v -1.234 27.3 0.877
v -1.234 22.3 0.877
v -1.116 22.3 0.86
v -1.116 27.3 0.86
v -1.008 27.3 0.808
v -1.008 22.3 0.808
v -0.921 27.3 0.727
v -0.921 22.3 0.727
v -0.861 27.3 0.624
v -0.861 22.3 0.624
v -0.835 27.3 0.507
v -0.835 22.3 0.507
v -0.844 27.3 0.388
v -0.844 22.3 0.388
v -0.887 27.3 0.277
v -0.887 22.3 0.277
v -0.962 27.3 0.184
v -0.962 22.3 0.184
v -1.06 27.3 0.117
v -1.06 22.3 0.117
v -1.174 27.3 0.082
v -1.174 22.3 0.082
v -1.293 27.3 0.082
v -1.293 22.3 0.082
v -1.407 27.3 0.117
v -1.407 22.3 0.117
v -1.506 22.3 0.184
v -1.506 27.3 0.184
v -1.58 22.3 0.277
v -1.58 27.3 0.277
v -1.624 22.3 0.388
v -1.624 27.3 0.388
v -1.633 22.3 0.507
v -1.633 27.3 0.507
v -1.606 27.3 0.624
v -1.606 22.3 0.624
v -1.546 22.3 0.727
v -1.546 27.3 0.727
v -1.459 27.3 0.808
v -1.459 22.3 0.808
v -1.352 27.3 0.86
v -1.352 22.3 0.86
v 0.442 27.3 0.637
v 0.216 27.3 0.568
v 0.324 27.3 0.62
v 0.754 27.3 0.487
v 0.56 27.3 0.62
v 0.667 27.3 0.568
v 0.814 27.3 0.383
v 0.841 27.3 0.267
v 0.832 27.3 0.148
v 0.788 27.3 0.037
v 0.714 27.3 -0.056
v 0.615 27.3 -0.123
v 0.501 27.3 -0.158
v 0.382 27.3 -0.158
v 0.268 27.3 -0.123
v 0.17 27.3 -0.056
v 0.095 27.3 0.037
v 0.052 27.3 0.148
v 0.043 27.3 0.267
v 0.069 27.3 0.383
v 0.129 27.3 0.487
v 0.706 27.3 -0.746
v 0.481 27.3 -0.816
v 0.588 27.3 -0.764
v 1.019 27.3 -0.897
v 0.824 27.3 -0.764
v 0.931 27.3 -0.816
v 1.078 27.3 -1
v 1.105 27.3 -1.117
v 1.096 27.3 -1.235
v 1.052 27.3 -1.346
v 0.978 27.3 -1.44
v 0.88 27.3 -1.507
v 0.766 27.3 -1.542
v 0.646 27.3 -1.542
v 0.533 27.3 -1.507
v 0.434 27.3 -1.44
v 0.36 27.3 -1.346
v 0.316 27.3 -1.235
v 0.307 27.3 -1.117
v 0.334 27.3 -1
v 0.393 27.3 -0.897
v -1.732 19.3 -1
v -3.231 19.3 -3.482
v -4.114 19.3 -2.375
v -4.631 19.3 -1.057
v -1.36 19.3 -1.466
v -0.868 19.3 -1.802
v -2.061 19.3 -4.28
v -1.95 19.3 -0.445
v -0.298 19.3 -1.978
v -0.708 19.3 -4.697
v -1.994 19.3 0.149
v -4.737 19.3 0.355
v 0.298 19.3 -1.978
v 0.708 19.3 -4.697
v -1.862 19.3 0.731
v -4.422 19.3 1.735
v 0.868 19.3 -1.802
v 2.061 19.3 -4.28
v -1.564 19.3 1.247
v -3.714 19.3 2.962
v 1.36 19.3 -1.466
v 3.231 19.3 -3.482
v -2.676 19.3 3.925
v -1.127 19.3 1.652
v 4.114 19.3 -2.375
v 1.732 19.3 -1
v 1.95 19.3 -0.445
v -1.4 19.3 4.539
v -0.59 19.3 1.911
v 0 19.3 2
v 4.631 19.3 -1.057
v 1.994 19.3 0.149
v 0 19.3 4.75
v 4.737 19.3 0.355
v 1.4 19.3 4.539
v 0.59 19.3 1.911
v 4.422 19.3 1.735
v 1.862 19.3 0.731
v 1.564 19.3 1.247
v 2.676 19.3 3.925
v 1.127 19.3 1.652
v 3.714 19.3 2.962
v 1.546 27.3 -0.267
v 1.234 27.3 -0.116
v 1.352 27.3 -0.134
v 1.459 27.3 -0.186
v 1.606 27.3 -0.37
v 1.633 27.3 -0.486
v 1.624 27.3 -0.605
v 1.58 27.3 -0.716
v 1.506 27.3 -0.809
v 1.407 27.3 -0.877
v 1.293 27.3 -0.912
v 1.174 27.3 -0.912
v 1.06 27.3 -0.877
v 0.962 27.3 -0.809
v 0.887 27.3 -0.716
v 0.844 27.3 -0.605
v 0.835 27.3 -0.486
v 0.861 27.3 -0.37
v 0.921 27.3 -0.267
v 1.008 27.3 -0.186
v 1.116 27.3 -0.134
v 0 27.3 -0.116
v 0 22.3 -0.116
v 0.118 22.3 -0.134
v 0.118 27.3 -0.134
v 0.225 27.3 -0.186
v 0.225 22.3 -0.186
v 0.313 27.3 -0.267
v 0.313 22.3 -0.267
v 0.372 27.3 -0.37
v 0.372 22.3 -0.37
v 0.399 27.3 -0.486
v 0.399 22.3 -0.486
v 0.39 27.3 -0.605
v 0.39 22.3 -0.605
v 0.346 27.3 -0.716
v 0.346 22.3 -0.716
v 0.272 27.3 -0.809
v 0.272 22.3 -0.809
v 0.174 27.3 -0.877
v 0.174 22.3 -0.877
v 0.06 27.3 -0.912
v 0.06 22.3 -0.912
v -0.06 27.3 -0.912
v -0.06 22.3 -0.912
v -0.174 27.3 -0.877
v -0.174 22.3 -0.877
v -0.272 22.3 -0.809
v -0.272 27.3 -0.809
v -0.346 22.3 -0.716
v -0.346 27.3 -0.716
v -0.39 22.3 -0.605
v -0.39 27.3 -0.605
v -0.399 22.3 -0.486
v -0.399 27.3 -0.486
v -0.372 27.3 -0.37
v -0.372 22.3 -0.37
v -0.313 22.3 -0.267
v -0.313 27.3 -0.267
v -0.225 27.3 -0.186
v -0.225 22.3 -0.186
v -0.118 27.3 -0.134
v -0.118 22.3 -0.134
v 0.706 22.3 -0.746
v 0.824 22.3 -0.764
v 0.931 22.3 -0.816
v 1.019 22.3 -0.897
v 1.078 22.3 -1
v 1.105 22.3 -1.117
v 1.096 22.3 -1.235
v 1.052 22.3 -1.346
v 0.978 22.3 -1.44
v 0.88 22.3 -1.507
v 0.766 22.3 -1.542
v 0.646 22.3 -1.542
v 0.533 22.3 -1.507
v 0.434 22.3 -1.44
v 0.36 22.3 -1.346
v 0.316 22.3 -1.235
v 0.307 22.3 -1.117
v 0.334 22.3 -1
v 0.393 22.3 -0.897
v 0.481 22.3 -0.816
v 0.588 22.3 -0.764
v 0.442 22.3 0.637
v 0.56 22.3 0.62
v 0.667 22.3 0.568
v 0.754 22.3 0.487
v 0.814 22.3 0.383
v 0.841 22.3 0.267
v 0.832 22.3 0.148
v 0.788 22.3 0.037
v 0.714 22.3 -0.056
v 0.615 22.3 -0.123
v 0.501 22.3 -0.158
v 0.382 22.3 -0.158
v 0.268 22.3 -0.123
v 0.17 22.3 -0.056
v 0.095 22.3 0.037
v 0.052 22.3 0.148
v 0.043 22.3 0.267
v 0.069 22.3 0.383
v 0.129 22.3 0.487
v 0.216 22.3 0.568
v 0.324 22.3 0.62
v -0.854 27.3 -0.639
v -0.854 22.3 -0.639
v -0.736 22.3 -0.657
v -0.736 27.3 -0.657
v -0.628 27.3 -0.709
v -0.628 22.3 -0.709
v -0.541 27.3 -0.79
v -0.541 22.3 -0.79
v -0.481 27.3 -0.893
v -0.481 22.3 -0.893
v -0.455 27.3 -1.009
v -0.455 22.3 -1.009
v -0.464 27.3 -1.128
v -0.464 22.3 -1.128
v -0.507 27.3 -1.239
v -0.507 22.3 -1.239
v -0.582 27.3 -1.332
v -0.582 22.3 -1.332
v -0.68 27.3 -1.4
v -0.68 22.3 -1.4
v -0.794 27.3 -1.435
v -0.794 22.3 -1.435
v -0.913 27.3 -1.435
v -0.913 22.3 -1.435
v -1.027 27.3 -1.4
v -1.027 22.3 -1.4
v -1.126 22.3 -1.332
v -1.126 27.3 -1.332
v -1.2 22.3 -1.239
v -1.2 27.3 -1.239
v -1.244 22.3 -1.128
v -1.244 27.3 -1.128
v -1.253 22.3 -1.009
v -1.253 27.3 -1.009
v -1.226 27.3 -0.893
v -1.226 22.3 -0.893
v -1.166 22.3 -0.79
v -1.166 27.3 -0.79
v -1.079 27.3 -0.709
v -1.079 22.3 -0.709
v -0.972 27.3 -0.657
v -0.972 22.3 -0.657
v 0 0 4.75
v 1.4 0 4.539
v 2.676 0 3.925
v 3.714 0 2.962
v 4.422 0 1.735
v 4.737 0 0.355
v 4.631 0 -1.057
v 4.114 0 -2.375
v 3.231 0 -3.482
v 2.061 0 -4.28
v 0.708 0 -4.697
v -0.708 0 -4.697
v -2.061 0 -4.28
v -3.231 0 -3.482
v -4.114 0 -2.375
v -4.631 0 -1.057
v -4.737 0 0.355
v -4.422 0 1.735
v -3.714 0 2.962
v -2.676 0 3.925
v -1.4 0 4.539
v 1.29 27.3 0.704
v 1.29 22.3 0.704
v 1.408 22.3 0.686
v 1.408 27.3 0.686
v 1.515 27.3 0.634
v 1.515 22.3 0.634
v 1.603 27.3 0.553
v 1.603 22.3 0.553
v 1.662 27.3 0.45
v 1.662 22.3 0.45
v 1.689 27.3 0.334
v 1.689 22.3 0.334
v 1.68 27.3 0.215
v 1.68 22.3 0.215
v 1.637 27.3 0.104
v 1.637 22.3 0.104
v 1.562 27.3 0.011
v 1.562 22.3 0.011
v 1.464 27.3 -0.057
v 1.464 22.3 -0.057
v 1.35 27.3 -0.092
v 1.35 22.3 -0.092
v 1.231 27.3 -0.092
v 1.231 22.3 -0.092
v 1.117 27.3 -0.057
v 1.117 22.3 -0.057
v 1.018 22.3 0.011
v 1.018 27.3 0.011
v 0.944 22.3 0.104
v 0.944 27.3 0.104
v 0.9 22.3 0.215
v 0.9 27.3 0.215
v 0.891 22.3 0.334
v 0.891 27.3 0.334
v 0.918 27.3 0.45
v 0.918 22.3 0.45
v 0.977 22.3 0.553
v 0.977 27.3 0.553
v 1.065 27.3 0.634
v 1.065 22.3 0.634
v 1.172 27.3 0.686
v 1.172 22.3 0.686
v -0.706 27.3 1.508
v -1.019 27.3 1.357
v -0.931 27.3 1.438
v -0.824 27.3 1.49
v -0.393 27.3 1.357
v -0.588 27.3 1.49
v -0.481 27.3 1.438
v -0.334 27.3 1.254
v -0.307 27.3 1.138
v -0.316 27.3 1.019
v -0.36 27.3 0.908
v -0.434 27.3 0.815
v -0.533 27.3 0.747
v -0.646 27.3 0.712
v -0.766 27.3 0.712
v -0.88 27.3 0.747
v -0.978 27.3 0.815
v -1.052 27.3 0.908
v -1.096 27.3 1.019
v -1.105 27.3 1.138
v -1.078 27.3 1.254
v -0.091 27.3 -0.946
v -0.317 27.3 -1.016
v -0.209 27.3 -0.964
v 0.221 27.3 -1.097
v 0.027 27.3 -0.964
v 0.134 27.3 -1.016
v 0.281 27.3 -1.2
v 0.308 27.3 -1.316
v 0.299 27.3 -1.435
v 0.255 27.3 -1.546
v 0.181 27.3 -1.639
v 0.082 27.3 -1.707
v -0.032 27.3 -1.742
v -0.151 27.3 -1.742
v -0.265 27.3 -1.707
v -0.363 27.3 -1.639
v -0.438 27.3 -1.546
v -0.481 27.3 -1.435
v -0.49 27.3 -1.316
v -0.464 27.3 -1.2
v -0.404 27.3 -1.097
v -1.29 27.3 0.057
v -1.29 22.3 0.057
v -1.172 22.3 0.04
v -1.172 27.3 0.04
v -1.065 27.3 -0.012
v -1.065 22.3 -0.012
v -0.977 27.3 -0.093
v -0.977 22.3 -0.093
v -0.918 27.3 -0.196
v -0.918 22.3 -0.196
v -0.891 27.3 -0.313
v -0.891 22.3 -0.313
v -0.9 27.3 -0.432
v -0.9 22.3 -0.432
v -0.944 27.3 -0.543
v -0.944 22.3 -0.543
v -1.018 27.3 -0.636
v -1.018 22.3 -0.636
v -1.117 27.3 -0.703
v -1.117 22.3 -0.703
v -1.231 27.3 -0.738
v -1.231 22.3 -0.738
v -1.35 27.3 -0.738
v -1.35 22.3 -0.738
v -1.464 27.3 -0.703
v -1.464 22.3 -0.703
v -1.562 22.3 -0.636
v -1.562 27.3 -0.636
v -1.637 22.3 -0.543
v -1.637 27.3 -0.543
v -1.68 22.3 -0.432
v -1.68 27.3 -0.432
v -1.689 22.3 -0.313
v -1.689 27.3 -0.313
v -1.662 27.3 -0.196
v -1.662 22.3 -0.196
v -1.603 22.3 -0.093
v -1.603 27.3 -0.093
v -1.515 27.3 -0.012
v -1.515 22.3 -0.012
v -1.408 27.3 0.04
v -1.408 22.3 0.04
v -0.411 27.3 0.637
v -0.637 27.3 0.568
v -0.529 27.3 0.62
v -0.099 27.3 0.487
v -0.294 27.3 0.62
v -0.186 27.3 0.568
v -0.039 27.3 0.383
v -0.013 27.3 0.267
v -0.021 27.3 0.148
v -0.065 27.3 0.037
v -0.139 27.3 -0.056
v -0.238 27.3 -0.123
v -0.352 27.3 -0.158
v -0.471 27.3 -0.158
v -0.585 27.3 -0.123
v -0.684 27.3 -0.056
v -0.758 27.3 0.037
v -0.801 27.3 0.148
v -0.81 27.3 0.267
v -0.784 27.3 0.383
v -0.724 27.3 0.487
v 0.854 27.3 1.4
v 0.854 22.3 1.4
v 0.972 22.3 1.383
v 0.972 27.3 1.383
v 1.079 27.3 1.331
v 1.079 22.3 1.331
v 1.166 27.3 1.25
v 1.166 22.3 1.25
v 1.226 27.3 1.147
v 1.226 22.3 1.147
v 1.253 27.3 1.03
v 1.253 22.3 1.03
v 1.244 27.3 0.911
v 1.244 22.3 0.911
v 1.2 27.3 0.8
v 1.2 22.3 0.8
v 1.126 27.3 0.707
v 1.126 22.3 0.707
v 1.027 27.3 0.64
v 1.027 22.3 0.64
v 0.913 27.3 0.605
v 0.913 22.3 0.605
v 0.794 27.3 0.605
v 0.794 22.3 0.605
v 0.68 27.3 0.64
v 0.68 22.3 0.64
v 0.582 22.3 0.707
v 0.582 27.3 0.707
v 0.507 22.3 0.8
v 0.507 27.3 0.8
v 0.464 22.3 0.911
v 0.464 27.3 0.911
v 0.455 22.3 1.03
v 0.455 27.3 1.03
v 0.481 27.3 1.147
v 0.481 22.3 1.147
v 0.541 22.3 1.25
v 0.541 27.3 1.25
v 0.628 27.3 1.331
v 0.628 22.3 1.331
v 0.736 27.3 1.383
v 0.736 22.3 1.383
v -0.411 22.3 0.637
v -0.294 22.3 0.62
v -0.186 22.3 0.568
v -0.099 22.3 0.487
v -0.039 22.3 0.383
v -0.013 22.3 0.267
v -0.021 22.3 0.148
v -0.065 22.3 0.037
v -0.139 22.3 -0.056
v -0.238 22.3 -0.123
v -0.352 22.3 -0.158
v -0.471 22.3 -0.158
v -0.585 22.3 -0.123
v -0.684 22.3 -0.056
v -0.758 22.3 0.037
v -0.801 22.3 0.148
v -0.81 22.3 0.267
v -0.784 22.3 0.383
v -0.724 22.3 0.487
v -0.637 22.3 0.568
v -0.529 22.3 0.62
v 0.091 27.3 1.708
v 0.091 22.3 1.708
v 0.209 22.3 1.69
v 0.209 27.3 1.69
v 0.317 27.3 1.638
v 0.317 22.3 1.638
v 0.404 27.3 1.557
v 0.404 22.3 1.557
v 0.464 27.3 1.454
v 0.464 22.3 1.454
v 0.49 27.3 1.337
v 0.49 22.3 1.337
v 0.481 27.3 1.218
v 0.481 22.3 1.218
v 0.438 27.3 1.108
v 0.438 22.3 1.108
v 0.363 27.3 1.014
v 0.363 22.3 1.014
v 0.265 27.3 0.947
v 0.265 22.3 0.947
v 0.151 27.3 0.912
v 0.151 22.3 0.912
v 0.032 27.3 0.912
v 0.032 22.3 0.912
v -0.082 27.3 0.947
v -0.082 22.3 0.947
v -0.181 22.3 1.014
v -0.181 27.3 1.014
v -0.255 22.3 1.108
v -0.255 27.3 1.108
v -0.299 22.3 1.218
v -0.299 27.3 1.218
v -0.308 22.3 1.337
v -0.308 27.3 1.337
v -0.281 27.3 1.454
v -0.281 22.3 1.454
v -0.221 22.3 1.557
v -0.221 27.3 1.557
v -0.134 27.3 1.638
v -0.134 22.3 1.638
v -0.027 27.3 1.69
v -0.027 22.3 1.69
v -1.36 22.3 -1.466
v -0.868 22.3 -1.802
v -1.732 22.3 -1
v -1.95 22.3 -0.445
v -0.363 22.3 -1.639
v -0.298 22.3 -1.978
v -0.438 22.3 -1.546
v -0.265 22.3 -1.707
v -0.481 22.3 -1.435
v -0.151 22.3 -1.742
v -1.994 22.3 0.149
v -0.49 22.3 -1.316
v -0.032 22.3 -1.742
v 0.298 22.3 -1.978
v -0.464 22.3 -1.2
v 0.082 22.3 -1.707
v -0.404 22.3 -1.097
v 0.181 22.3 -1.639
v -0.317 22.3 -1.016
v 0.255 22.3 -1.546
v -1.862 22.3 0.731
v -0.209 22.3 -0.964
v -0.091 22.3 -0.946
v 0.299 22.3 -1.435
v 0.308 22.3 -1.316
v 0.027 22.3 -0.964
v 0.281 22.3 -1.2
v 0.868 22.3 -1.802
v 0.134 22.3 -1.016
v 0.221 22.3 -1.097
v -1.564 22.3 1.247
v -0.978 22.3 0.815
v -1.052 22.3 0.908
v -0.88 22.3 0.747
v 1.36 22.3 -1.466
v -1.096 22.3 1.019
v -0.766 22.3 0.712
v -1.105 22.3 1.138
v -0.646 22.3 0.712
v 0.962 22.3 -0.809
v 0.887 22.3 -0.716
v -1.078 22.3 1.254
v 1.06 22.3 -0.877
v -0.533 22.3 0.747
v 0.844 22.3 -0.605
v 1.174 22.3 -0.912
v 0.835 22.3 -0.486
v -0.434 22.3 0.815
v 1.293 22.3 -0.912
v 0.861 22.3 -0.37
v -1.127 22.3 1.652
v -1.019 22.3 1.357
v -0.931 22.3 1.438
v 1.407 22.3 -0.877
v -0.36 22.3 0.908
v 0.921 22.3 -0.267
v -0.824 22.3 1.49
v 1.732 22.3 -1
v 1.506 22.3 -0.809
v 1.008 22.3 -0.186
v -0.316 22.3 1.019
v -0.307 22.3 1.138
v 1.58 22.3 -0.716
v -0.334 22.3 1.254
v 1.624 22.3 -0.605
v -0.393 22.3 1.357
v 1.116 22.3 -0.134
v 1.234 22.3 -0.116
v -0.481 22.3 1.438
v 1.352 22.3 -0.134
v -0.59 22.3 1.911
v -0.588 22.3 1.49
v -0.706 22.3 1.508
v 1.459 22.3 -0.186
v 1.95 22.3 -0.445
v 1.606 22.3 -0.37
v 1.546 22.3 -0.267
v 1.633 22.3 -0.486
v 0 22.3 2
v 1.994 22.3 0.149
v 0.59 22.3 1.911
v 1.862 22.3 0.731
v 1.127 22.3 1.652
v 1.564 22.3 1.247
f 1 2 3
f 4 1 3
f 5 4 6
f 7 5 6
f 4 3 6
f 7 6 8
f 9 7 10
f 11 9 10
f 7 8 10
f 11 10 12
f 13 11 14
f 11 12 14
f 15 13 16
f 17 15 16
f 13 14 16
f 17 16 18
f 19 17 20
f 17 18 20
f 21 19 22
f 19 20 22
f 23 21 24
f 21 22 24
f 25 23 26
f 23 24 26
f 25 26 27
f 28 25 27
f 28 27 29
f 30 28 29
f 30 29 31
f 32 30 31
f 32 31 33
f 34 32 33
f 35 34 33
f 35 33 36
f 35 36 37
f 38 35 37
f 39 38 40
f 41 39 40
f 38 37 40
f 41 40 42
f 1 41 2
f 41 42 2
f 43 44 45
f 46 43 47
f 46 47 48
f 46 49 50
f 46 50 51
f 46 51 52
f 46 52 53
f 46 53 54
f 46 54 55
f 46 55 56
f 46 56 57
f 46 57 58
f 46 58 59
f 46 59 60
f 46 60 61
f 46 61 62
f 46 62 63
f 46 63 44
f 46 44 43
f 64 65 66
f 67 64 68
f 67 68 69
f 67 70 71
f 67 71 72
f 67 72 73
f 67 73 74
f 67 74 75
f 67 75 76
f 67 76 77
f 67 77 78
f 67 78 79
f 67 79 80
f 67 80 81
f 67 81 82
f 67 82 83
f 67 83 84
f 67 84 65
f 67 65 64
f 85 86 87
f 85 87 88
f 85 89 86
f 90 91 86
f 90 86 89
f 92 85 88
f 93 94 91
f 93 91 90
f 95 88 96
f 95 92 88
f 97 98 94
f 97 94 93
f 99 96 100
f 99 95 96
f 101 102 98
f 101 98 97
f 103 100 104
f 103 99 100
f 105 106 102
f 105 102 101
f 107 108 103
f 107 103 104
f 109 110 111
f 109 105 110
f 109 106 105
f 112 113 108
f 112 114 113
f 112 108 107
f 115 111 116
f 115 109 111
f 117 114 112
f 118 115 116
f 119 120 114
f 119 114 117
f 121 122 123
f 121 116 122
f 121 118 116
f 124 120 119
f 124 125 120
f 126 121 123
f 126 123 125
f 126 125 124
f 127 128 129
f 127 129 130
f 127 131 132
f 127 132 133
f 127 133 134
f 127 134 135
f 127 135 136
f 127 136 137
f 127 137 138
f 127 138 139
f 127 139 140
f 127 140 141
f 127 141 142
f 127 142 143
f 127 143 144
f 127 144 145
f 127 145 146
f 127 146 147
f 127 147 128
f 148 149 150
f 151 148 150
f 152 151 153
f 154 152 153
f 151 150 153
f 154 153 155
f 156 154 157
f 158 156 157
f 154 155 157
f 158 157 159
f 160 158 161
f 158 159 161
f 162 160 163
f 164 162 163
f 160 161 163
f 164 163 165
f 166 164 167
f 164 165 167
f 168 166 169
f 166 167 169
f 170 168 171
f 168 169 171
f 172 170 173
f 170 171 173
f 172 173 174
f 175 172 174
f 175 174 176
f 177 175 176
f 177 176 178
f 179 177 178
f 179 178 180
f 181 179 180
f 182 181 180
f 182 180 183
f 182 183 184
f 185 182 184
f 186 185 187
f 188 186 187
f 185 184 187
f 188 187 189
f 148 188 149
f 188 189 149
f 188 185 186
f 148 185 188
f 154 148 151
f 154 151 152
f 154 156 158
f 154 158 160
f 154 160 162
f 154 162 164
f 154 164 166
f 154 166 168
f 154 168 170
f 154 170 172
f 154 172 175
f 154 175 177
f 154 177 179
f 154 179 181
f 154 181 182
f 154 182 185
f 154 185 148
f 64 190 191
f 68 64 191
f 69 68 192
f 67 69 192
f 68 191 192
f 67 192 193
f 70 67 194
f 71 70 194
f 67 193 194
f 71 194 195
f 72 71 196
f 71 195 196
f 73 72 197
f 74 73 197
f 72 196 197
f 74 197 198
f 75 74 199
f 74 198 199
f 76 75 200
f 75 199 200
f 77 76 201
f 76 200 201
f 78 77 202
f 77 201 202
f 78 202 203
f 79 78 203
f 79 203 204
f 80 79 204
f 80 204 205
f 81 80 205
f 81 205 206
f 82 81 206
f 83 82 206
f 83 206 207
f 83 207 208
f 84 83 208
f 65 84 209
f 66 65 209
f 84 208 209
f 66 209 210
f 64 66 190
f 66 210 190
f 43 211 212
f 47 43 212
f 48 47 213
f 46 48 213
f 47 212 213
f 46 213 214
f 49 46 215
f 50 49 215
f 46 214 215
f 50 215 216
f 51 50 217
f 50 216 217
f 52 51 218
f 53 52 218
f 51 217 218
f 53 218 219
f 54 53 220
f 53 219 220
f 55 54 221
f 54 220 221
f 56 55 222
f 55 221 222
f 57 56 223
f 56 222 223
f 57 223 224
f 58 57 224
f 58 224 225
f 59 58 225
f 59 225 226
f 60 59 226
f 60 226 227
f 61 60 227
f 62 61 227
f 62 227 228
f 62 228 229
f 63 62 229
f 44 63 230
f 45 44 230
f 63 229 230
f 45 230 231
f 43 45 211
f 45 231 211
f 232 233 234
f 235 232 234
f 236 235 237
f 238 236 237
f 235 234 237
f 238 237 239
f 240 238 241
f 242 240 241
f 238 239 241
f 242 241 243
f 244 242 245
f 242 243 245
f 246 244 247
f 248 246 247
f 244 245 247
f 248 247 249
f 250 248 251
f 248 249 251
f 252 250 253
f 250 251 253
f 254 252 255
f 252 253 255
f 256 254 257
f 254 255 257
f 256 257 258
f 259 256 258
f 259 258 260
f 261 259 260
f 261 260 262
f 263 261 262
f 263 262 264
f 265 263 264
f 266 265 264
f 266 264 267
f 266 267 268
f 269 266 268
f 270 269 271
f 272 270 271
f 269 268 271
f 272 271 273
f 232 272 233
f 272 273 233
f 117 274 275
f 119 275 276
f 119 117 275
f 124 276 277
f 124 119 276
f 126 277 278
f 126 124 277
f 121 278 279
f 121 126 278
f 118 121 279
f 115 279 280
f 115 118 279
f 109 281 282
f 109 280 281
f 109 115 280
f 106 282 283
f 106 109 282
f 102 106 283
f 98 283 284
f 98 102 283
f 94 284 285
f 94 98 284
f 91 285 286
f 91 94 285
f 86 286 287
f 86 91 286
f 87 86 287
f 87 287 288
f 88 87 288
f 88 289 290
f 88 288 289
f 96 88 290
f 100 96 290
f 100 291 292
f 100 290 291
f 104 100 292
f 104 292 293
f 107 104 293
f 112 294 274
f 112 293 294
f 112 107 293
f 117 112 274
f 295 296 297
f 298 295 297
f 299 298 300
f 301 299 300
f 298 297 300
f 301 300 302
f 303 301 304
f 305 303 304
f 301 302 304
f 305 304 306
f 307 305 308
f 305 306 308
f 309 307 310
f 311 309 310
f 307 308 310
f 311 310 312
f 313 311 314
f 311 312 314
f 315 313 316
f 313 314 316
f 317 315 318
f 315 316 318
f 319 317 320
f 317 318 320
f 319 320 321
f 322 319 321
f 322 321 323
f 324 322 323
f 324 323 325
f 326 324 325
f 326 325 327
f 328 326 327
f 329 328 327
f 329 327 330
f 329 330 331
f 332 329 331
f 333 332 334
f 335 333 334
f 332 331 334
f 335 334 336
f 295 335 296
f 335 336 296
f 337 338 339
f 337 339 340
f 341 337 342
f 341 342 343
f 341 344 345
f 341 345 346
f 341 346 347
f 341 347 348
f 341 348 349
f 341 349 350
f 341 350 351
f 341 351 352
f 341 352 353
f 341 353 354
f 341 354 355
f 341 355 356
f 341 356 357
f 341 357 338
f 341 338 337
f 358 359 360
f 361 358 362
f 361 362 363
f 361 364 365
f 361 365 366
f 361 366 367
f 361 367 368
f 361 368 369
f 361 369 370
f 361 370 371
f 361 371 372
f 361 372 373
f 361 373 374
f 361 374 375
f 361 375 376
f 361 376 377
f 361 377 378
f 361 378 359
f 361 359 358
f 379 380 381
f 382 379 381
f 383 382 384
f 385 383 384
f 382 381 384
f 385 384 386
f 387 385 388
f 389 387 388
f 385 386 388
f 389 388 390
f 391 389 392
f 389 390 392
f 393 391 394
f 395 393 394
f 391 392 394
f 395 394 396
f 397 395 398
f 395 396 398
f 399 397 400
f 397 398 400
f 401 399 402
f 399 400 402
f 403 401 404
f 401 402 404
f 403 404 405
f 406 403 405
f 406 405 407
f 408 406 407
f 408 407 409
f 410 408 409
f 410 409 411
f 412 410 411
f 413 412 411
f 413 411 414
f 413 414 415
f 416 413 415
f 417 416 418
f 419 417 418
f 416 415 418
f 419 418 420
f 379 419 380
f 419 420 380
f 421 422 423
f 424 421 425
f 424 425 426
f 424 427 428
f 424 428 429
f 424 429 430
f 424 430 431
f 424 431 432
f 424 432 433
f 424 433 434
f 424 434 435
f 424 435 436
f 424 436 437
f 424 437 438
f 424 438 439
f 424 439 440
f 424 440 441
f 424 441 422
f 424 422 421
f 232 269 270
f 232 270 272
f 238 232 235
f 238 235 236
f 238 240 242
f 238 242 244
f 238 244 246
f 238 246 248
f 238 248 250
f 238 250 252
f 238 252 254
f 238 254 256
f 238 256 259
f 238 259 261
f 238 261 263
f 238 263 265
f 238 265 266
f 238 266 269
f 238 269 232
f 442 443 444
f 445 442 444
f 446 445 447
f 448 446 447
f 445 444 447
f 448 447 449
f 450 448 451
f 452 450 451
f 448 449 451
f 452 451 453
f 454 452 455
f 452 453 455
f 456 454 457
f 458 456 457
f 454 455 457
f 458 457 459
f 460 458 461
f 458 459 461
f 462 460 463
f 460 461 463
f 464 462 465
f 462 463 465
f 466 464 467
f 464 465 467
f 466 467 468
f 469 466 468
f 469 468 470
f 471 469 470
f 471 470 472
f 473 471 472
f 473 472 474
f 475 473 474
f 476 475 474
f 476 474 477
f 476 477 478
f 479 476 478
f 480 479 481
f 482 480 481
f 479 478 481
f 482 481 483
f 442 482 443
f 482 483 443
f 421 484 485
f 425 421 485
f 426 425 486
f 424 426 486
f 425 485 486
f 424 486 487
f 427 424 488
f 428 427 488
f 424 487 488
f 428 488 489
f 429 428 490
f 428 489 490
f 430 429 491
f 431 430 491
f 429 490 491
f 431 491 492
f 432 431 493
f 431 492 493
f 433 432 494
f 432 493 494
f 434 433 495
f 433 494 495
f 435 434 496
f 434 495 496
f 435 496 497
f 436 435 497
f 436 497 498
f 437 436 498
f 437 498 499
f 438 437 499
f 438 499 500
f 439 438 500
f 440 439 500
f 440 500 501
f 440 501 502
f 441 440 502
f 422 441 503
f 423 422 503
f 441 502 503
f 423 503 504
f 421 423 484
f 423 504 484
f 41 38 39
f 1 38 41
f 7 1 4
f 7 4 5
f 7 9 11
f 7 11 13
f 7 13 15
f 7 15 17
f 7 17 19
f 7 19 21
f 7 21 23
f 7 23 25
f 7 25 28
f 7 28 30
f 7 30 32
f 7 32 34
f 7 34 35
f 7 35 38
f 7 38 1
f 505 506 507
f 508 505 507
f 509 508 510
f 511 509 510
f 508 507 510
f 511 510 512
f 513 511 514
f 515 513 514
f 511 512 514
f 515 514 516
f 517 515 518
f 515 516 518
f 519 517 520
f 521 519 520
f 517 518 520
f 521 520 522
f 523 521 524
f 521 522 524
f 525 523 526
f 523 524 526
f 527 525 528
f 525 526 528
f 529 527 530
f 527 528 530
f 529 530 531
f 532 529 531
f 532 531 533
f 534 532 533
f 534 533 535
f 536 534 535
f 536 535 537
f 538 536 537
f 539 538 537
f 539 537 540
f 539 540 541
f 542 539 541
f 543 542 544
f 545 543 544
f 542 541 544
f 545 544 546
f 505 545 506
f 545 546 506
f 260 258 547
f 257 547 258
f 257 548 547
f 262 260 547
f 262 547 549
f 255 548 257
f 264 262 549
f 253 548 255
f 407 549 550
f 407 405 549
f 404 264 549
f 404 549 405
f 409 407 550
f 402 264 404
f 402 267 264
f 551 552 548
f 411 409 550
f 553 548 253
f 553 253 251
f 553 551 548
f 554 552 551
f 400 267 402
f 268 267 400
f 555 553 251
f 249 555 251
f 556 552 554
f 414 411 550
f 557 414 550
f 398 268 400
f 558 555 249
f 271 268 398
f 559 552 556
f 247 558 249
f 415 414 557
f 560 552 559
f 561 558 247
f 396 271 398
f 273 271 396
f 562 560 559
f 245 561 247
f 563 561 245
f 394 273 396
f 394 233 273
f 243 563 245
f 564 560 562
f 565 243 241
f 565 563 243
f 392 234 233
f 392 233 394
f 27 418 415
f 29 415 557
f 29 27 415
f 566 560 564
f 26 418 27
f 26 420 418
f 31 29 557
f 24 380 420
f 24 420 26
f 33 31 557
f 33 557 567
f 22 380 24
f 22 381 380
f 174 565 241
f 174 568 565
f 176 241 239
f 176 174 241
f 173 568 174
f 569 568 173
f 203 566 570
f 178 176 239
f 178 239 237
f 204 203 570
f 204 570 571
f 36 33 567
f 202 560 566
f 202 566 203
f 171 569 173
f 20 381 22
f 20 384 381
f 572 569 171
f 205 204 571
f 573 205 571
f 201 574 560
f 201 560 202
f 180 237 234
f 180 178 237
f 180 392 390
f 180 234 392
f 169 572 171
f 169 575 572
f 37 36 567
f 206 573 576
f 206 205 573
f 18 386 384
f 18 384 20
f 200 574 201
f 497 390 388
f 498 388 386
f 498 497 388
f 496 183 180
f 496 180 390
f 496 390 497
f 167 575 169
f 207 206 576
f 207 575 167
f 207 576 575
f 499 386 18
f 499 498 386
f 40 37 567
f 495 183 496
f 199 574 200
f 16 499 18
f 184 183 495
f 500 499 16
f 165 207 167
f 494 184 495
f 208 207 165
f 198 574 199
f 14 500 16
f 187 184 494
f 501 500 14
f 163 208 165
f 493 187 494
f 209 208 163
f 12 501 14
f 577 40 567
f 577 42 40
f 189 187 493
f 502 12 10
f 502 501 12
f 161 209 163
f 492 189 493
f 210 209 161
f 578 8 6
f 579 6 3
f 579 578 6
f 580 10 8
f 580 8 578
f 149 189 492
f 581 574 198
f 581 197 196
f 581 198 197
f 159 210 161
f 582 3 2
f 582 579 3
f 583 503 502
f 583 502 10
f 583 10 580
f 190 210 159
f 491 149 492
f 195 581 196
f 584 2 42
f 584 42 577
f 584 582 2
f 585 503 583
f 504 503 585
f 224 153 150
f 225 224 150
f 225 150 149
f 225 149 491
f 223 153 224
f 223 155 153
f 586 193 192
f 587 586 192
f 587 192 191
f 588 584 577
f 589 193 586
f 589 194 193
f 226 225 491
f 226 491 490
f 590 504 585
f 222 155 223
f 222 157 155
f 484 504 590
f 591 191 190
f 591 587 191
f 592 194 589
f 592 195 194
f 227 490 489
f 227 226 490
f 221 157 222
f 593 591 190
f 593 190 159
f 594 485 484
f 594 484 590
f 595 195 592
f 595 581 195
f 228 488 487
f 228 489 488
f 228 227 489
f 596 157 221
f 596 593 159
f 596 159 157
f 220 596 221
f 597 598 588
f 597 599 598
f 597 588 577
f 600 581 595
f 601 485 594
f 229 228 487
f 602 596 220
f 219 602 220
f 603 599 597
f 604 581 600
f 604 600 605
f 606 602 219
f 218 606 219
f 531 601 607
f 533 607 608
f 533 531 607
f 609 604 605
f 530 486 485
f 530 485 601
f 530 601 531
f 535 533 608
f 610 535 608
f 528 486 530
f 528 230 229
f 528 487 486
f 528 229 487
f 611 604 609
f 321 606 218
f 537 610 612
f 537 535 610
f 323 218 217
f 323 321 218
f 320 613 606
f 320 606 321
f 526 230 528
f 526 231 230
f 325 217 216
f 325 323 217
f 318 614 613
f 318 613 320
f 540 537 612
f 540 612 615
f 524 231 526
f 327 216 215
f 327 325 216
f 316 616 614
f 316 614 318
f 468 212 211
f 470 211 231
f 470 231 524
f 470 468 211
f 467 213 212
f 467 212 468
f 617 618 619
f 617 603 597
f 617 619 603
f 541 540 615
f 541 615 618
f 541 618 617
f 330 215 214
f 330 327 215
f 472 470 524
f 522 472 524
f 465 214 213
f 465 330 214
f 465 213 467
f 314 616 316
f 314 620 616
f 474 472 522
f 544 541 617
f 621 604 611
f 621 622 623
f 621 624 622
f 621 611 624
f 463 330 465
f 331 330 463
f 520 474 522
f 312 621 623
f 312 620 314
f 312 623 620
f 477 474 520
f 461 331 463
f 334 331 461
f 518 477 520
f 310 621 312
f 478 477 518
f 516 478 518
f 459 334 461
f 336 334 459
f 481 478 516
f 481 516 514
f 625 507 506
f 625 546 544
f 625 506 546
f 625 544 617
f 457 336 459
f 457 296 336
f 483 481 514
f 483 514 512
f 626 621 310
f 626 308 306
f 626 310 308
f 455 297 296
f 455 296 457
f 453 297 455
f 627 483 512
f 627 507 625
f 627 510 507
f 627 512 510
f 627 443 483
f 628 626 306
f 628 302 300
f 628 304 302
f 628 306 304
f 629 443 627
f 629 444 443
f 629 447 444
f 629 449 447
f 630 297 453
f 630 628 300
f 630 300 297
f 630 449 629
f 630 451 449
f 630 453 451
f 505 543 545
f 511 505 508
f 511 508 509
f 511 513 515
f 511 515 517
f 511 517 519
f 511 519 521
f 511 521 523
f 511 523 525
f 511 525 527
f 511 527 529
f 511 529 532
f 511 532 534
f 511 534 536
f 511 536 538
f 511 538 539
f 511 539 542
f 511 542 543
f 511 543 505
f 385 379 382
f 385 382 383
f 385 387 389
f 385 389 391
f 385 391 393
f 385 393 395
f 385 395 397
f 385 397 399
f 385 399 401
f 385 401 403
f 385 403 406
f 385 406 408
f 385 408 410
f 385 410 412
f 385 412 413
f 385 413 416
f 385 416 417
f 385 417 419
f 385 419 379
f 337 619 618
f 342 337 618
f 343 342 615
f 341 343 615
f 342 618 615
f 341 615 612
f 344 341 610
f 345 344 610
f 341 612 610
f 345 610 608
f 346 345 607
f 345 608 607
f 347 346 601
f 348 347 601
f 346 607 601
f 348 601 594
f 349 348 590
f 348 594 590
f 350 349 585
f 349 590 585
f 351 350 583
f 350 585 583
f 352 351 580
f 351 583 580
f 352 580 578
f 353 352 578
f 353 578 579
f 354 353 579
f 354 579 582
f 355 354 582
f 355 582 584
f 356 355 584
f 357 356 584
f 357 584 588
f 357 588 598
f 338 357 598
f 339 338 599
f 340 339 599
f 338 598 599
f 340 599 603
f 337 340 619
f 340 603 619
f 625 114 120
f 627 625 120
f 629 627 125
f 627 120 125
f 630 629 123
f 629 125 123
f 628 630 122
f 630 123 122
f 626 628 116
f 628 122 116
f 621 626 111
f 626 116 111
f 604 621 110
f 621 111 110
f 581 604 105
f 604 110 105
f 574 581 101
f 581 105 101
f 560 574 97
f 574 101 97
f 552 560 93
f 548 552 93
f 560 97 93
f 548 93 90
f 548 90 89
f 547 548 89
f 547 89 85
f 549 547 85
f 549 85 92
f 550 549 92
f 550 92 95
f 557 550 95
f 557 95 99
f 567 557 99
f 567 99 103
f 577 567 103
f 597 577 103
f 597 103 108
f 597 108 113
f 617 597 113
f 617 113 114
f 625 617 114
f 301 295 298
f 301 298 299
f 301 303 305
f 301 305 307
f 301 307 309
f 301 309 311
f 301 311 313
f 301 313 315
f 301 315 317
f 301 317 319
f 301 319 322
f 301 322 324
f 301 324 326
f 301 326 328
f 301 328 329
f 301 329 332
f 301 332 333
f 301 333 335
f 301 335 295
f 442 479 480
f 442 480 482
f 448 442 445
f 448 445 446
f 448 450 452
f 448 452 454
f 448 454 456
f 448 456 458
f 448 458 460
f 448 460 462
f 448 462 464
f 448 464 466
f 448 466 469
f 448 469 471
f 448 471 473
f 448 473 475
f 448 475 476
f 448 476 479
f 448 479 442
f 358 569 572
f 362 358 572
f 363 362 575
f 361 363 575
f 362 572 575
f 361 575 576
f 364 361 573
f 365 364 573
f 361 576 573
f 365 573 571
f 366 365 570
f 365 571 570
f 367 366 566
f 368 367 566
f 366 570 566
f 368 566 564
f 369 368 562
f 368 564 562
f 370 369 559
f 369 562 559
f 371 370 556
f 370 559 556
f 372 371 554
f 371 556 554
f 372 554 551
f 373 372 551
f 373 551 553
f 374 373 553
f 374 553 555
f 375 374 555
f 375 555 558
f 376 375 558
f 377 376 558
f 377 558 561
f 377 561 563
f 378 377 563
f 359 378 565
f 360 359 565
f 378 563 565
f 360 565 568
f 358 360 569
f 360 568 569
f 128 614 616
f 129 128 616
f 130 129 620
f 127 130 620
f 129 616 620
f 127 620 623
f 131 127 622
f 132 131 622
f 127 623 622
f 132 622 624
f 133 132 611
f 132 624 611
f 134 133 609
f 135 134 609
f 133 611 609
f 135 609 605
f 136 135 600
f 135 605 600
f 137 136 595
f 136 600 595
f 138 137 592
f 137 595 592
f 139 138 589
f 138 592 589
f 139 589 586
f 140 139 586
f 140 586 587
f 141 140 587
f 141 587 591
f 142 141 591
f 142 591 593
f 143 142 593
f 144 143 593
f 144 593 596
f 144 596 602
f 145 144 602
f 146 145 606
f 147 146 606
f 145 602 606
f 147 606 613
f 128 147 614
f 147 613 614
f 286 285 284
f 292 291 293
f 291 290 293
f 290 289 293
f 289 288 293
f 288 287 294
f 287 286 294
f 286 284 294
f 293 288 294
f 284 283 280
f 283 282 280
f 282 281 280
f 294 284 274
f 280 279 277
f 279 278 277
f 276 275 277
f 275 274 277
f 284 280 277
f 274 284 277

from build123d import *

# Parameters (mm, degrees)
SKETCH1_R           = 6.2
BOSS_EXTRUDE1_DEPTH = 19.5
SKETCH2_R           = 2
BOSS_EXTRUDE2_DEPTH = 2.8
SKETCH3_R           = 0.4
BOSS_EXTRUDE4_DEPTH = 5
CUT_EXTRUDE1_START  = -0.2
SKETCH4_R           = 4.75
SKETCH4_R_2         = 2
CUT_EXTRUDE1_DEPTH  = 0.2
SKETCH5_R           = 0.4
BOSS_EXTRUDE5_DEPTH = 3.5
SKETCH6_R           = 6.2
SKETCH6_R_2         = 4.75
CUT_EXTRUDE2_DEPTH  = 25.614629796
SKETCH7_R           = 9.512731099
CUT_EXTRUDE3_DEPTH  = 29.114320195


with BuildPart() as part:
    # Sketch1 → Boss-Extrude1 (new body)
    with BuildSketch(Plane(origin=(0, 0, 0), x_dir=(1, 0, 0), z_dir=(0, 1, 0))):
        with Locations(Location((0, 0, 0), (0, 0, 270))):
            Circle(SKETCH1_R)
    extrude(amount=BOSS_EXTRUDE1_DEPTH)

    # Sketch2 → Boss-Extrude2 (add)
    with BuildSketch(Plane(origin=(0, 19.5, 0), x_dir=(1, 0, 0), z_dir=(0, 1, 0))):
        with Locations(Location((0, 0, 0), (0, 0, 270))):
            Circle(SKETCH2_R)
    extrude(amount=BOSS_EXTRUDE2_DEPTH)

    # Sketch3 → Boss-Extrude4 (add)
    with BuildSketch(Plane(origin=(0, 22.3, 0), x_dir=(1, 0, 0), z_dir=(0, 1, 0))):
        with Locations(Location((-0.41145274, -0.237271907, 0), (0, 0, 270))):
            Circle(SKETCH3_R)
        with Locations(Location((-0.09128588, 1.346231062, 0), (0, 0, 270))):
            Circle(SKETCH3_R)
        with Locations(Location((0.706061251, 1.146478436, 0), (0, 0, 270))):
            Circle(SKETCH3_R)
        with Locations(Location((1.233716983, 0.516206281, 0), (0, 0, 270))):
            Circle(SKETCH3_R)
        with Locations(Location((1.29013476, -0.30384286, 0), (0, 0, 270))):
            Circle(SKETCH3_R)
        with Locations(Location((0.853764908, -1.000438089, 0), (0, 0, 270))):
            Circle(SKETCH3_R)
        with Locations(Location((0.09128588, -1.307503705, 0), (0, 0, 270))):
            Circle(SKETCH3_R)
        with Locations(Location((-0.706061251, -1.107751078, 0), (0, 0, 270))):
            Circle(SKETCH3_R)
        with Locations(Location((-1.233716983, -0.477478923, 0), (0, 0, 270))):
            Circle(SKETCH3_R)
        with Locations(Location((-1.29013476, 0.342570218, 0), (0, 0, 270))):
            Circle(SKETCH3_R)
        with Locations(Location((-0.853764908, 1.039165447, 0), (0, 0, 270))):
            Circle(SKETCH3_R)
        with Locations(Location((0, 0.516206281, 0), (0, 0, 270))):
            Circle(SKETCH3_R)
        with Locations(Location((0.441742202, -0.237271907, 0), (0, 0, 270))):
            Circle(SKETCH3_R)
    extrude(amount=BOSS_EXTRUDE4_DEPTH)

    # Sketch4 → Cut-Extrude1 (cut)
    with BuildSketch(Plane(origin=(0, 19.5, 0), x_dir=(1, 0, 0), z_dir=(0, 1, 0)).offset(CUT_EXTRUDE1_START)):
        with Locations(Location((0, 0, 0), (0, 0, 270))):
            Circle(SKETCH4_R)
        with Locations(Location((0, 0, 0), (0, 0, 270))):
            Circle(SKETCH4_R_2, mode=Mode.SUBTRACT)
    extrude(amount=CUT_EXTRUDE1_DEPTH, mode=Mode.SUBTRACT)

    # Sketch5 → Boss-Extrude5 (add)
    with BuildSketch(Plane.XZ):
        with Locations(Location((-5.700120356, 0, 0), (0, 0, 90))):
            Circle(SKETCH5_R)
        with Locations(Location((-5.629942415, 0.891695278, 0), (0, 0, 90))):
            Circle(SKETCH5_R)
        with Locations(Location((-4.791405516, 0, 0), (0, 0, 90))):
            Circle(SKETCH5_R)
        with Locations(Location((-4.703373902, 0.914243273, 0), (0, 0, 90))):
            Circle(SKETCH5_R)
        with Locations(Location((-4.703373902, -0.914243273, 0), (0, 0, 90))):
            Circle(SKETCH5_R)
        with Locations(Location((-5.629942415, -0.891695278, 0), (0, 0, 90))):
            Circle(SKETCH5_R)
        with Locations(Location((5.629942415, -0.891695278, 0), (0, 0, 90))):
            Circle(SKETCH5_R)
        with Locations(Location((4.703373902, -0.914243273, 0), (0, 0, 90))):
            Circle(SKETCH5_R)
        with Locations(Location((4.703373902, 0.914243273, 0), (0, 0, 90))):
            Circle(SKETCH5_R)
        with Locations(Location((4.791405516, 0, 0), (0, 0, 90))):
            Circle(SKETCH5_R)
        with Locations(Location((5.629942415, 0.891695278, 0), (0, 0, 90))):
            Circle(SKETCH5_R)
        with Locations(Location((5.700120356, 0, 0), (0, 0, 90))):
            Circle(SKETCH5_R)
    extrude(amount=BOSS_EXTRUDE5_DEPTH)

    # Sketch6 → Cut-Extrude2 (cut, through all)
    with BuildSketch(Plane(origin=(0, 19.5, 0), x_dir=(1, 0, 0), z_dir=(0, 1, 0))):
        Circle(SKETCH6_R)
        with Locations(Location((0, 0, 0), (0, 0, 270))):
            Circle(SKETCH6_R_2, mode=Mode.SUBTRACT)
    extrude(amount=-CUT_EXTRUDE2_DEPTH, mode=Mode.SUBTRACT)

    # Sketch7 → Cut-Extrude3 (cut, through all)
    with BuildSketch(Plane.XZ):
        Circle(SKETCH7_R)
    extrude(amount=CUT_EXTRUDE3_DEPTH, mode=Mode.SUBTRACT)


solid = part.part
